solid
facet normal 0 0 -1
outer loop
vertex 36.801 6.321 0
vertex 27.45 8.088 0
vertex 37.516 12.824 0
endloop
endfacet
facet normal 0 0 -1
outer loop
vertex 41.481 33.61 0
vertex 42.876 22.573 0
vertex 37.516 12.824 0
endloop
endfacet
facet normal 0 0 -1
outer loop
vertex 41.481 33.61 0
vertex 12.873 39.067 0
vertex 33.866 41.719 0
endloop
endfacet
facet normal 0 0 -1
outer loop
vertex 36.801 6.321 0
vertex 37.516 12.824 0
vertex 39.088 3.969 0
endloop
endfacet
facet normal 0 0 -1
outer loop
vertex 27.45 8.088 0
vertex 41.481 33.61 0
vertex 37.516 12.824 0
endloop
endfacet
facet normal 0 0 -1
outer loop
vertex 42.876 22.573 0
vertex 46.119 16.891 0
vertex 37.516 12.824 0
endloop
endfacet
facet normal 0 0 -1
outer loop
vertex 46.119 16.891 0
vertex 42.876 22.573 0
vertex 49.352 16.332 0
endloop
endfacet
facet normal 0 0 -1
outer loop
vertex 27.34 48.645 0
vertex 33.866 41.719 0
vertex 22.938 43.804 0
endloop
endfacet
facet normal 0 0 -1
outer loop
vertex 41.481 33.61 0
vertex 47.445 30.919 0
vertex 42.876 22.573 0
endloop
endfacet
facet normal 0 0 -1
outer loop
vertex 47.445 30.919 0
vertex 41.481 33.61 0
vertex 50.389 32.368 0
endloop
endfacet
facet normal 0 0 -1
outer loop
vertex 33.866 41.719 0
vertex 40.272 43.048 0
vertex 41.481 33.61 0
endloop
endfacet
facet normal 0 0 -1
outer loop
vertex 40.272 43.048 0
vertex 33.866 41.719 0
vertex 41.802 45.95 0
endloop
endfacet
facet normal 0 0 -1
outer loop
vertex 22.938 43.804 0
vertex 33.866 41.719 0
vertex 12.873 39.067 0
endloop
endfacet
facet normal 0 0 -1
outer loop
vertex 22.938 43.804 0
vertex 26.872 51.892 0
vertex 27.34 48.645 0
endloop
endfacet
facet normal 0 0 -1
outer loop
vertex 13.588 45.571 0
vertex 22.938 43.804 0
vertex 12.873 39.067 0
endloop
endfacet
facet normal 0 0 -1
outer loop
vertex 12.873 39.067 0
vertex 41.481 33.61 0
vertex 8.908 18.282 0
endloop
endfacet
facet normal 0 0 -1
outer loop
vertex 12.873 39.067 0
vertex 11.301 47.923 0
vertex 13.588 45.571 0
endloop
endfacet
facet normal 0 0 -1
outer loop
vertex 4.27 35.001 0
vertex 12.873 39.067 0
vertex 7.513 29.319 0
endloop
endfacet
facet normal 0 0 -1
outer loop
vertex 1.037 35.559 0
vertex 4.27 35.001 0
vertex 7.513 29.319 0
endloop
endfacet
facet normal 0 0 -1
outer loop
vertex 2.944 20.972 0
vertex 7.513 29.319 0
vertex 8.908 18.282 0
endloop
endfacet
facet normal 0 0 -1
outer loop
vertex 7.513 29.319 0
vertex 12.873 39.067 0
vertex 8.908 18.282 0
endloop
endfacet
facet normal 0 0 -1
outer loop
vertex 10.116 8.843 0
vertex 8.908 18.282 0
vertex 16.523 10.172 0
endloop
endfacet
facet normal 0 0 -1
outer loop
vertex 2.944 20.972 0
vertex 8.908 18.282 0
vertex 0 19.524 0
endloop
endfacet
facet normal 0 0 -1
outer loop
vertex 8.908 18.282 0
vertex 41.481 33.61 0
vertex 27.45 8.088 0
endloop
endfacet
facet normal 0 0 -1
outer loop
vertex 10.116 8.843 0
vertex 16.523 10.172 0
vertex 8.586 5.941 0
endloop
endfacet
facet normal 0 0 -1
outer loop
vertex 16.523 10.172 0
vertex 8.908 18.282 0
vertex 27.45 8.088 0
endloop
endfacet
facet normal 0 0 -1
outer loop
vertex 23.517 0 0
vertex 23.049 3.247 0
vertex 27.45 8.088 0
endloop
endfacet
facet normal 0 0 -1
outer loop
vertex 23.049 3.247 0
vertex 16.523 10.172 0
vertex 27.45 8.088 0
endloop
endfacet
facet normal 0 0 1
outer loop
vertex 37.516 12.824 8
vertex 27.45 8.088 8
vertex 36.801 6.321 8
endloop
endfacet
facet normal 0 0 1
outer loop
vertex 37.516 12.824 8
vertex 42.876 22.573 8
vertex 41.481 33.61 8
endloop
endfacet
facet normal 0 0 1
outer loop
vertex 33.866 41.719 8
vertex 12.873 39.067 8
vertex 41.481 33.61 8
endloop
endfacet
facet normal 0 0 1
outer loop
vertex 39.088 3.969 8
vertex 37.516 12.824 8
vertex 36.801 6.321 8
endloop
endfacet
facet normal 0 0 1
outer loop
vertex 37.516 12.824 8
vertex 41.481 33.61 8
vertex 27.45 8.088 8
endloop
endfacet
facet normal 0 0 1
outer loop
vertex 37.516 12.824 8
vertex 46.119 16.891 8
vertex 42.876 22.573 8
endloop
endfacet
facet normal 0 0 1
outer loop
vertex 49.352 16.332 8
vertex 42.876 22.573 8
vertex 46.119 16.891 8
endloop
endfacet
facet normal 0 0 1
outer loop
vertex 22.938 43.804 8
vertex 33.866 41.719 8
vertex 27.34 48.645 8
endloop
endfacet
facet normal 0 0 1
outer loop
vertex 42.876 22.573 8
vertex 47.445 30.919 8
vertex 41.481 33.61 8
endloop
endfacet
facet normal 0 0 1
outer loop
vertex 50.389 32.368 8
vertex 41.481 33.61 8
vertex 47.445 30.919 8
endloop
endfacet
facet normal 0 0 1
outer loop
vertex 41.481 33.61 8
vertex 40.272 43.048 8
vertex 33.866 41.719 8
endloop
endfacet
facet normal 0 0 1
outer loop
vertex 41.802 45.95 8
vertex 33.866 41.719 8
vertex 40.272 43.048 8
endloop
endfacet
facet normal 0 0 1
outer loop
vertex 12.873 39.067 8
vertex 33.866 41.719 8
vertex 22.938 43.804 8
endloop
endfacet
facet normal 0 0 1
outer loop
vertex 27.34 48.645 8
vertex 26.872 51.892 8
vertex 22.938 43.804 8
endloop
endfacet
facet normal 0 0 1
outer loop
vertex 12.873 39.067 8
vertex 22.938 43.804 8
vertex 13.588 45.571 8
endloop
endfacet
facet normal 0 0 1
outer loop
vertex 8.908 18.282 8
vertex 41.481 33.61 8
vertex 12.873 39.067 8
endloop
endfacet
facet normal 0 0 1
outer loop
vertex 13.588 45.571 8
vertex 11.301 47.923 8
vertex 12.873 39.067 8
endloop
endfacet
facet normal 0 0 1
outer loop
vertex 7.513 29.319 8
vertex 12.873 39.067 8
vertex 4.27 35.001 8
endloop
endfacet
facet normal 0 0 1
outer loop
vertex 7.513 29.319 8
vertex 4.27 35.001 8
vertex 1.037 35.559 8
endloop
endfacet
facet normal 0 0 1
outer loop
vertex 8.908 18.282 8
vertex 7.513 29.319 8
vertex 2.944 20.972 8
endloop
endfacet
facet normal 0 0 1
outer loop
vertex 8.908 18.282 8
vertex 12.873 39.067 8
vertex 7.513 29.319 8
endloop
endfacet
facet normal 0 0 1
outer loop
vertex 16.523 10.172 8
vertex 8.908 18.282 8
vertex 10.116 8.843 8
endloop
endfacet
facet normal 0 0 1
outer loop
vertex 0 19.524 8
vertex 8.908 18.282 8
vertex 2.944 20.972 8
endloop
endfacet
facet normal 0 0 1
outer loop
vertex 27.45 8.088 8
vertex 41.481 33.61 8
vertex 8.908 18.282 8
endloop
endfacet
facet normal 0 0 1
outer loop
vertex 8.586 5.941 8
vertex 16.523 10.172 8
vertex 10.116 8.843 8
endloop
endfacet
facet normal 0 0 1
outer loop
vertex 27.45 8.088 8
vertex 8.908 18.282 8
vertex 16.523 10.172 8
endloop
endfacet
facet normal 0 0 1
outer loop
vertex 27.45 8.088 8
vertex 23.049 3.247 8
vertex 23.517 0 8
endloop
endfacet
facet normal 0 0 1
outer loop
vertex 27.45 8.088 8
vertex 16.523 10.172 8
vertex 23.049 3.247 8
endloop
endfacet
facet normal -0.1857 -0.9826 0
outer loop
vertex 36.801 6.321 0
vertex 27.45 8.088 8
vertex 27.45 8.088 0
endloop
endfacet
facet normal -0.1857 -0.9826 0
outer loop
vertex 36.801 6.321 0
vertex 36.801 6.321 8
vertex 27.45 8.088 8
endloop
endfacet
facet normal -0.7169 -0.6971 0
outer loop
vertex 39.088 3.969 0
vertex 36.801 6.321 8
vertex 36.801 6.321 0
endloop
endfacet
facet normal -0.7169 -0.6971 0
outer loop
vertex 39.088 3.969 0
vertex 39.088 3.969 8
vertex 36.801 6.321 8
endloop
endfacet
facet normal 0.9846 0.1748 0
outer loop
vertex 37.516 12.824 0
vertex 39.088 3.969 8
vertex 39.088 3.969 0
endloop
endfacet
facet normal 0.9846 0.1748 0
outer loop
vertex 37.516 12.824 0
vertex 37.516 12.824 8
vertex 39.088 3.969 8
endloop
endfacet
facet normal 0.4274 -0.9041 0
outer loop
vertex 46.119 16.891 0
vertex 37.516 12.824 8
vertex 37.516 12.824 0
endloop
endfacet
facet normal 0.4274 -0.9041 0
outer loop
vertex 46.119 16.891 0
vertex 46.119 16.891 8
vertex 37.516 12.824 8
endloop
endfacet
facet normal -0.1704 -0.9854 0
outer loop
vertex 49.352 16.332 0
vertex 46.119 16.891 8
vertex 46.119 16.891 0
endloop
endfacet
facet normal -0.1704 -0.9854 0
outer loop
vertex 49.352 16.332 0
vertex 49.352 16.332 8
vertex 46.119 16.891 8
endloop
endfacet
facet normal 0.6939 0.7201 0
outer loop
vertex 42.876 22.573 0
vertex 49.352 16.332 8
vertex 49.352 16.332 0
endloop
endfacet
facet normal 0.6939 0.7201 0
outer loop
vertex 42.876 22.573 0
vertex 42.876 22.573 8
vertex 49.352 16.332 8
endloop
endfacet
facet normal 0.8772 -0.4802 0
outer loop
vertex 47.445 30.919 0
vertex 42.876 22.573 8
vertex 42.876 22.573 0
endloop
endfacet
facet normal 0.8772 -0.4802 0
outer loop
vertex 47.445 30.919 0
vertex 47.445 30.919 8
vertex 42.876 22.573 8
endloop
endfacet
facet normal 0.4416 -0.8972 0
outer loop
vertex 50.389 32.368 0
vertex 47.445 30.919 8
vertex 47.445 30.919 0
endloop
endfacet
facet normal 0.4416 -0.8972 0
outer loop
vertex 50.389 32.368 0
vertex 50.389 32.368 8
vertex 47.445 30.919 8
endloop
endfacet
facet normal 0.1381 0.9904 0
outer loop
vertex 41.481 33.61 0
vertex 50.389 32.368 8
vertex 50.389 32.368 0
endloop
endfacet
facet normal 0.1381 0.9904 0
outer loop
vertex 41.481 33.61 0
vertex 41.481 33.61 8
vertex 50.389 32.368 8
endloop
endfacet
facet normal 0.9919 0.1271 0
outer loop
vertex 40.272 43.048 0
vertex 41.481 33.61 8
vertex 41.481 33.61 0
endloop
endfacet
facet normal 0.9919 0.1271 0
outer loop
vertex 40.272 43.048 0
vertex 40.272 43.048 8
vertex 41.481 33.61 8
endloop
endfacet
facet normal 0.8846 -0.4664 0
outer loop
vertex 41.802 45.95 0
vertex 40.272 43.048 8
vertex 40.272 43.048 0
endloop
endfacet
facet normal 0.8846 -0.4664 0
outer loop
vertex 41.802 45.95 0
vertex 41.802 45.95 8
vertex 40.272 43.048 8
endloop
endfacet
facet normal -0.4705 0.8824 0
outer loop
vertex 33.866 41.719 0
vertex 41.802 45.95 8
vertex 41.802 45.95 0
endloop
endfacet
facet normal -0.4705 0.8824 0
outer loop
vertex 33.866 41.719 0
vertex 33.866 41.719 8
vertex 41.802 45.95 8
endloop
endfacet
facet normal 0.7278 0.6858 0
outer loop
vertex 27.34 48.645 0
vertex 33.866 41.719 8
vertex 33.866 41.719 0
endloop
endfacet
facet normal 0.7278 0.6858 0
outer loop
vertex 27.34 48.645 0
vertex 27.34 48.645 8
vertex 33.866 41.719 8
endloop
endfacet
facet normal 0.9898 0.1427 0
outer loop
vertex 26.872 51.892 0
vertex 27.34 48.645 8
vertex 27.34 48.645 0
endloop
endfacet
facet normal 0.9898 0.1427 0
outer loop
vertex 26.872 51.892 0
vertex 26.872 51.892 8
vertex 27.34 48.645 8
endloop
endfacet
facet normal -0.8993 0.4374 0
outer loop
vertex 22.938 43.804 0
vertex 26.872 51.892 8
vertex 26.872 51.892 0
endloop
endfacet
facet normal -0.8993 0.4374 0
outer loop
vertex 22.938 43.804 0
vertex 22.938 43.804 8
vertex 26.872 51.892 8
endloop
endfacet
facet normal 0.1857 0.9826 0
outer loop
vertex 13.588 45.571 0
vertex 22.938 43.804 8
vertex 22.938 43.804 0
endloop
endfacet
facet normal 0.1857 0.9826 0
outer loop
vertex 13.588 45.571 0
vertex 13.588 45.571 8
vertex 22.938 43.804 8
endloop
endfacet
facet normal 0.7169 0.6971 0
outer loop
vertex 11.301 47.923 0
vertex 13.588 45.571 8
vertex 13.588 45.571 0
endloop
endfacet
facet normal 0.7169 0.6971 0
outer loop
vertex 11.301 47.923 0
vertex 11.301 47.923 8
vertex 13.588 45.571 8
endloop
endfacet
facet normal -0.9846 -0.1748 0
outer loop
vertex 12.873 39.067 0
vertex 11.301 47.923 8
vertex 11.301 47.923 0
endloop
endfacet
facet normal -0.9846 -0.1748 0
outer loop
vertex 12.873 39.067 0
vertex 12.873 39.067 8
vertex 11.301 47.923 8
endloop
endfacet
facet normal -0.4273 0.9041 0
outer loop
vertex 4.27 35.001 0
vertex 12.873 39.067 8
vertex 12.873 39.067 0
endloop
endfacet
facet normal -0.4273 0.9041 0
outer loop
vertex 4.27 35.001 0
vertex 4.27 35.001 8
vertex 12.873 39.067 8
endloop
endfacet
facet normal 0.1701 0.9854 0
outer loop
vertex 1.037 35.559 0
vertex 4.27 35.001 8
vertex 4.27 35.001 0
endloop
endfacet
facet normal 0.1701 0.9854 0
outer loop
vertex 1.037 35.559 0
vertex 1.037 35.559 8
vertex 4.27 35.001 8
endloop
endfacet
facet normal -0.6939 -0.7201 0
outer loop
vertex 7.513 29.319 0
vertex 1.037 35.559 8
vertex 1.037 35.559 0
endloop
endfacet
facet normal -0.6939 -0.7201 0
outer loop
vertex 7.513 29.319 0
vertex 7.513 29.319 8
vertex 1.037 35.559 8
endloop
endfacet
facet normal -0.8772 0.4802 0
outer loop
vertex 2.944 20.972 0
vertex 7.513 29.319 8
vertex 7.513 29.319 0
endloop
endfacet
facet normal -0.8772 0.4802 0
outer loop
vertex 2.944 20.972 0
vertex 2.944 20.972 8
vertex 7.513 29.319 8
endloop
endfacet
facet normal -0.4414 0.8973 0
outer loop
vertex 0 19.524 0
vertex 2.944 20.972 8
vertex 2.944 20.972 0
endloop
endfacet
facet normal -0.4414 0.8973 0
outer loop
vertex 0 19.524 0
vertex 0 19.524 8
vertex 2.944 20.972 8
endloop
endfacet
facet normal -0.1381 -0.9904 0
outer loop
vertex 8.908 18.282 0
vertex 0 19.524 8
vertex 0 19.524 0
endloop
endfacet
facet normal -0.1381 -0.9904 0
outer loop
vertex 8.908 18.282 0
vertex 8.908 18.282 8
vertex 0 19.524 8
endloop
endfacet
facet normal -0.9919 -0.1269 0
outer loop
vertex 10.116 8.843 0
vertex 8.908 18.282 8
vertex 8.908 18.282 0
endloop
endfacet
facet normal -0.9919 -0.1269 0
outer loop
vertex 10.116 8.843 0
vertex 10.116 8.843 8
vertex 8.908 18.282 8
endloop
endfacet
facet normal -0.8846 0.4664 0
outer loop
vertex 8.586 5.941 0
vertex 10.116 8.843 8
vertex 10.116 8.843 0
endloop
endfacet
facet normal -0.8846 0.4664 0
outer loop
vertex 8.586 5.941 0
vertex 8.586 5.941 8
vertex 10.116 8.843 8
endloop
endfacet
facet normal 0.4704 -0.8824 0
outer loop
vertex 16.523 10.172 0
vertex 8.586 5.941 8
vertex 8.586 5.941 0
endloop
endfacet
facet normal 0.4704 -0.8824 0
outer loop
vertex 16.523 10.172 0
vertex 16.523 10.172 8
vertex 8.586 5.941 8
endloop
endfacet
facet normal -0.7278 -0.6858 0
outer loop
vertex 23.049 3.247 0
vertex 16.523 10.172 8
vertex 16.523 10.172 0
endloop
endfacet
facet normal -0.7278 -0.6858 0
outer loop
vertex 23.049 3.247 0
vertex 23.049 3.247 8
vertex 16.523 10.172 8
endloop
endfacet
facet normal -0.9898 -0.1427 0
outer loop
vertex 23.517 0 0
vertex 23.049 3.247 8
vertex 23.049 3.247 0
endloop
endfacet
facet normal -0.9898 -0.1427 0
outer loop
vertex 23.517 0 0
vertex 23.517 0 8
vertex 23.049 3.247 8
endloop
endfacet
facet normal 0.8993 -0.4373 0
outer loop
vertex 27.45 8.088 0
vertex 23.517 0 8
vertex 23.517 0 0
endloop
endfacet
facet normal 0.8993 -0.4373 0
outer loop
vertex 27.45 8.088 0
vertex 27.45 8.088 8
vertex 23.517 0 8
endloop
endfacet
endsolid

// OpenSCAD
$fn = 32;

// ----------------------------------------------------------------------
// Fan rotor section: 10 blades, 18 mm hub radius, 8 mm blades
// ----------------------------------------------------------------------

// --- parameters (mm) ---
profile_height = 8;       // extrusion height
profile_points = 30;      // points of the closed outline

profile = [[42.876, 22.573], [47.445, 30.919], [50.389, 32.368], [41.481, 33.61], [40.272, 43.048], [41.802, 45.95], [33.866, 41.719], [27.34, 48.645], [26.872, 51.892], [22.938, 43.804], [13.588, 45.571], [11.301, 47.923], [12.873, 39.067], [4.27, 35.001], [1.037, 35.559], [7.513, 29.319], [2.944, 20.972], [0, 19.524], [8.908, 18.282], [10.116, 8.843], [8.586, 5.941], [16.523, 10.172], [23.049, 3.247], [23.517, 0], [27.45, 8.088], [36.801, 6.321], [39.088, 3.969], [37.516, 12.824], [46.119, 16.891], [49.352, 16.332]];  // single closed polygon, 30 points, counter clockwise

// --- the one profile operation ---
linear_extrude(height = profile_height) polygon(points = profile);
